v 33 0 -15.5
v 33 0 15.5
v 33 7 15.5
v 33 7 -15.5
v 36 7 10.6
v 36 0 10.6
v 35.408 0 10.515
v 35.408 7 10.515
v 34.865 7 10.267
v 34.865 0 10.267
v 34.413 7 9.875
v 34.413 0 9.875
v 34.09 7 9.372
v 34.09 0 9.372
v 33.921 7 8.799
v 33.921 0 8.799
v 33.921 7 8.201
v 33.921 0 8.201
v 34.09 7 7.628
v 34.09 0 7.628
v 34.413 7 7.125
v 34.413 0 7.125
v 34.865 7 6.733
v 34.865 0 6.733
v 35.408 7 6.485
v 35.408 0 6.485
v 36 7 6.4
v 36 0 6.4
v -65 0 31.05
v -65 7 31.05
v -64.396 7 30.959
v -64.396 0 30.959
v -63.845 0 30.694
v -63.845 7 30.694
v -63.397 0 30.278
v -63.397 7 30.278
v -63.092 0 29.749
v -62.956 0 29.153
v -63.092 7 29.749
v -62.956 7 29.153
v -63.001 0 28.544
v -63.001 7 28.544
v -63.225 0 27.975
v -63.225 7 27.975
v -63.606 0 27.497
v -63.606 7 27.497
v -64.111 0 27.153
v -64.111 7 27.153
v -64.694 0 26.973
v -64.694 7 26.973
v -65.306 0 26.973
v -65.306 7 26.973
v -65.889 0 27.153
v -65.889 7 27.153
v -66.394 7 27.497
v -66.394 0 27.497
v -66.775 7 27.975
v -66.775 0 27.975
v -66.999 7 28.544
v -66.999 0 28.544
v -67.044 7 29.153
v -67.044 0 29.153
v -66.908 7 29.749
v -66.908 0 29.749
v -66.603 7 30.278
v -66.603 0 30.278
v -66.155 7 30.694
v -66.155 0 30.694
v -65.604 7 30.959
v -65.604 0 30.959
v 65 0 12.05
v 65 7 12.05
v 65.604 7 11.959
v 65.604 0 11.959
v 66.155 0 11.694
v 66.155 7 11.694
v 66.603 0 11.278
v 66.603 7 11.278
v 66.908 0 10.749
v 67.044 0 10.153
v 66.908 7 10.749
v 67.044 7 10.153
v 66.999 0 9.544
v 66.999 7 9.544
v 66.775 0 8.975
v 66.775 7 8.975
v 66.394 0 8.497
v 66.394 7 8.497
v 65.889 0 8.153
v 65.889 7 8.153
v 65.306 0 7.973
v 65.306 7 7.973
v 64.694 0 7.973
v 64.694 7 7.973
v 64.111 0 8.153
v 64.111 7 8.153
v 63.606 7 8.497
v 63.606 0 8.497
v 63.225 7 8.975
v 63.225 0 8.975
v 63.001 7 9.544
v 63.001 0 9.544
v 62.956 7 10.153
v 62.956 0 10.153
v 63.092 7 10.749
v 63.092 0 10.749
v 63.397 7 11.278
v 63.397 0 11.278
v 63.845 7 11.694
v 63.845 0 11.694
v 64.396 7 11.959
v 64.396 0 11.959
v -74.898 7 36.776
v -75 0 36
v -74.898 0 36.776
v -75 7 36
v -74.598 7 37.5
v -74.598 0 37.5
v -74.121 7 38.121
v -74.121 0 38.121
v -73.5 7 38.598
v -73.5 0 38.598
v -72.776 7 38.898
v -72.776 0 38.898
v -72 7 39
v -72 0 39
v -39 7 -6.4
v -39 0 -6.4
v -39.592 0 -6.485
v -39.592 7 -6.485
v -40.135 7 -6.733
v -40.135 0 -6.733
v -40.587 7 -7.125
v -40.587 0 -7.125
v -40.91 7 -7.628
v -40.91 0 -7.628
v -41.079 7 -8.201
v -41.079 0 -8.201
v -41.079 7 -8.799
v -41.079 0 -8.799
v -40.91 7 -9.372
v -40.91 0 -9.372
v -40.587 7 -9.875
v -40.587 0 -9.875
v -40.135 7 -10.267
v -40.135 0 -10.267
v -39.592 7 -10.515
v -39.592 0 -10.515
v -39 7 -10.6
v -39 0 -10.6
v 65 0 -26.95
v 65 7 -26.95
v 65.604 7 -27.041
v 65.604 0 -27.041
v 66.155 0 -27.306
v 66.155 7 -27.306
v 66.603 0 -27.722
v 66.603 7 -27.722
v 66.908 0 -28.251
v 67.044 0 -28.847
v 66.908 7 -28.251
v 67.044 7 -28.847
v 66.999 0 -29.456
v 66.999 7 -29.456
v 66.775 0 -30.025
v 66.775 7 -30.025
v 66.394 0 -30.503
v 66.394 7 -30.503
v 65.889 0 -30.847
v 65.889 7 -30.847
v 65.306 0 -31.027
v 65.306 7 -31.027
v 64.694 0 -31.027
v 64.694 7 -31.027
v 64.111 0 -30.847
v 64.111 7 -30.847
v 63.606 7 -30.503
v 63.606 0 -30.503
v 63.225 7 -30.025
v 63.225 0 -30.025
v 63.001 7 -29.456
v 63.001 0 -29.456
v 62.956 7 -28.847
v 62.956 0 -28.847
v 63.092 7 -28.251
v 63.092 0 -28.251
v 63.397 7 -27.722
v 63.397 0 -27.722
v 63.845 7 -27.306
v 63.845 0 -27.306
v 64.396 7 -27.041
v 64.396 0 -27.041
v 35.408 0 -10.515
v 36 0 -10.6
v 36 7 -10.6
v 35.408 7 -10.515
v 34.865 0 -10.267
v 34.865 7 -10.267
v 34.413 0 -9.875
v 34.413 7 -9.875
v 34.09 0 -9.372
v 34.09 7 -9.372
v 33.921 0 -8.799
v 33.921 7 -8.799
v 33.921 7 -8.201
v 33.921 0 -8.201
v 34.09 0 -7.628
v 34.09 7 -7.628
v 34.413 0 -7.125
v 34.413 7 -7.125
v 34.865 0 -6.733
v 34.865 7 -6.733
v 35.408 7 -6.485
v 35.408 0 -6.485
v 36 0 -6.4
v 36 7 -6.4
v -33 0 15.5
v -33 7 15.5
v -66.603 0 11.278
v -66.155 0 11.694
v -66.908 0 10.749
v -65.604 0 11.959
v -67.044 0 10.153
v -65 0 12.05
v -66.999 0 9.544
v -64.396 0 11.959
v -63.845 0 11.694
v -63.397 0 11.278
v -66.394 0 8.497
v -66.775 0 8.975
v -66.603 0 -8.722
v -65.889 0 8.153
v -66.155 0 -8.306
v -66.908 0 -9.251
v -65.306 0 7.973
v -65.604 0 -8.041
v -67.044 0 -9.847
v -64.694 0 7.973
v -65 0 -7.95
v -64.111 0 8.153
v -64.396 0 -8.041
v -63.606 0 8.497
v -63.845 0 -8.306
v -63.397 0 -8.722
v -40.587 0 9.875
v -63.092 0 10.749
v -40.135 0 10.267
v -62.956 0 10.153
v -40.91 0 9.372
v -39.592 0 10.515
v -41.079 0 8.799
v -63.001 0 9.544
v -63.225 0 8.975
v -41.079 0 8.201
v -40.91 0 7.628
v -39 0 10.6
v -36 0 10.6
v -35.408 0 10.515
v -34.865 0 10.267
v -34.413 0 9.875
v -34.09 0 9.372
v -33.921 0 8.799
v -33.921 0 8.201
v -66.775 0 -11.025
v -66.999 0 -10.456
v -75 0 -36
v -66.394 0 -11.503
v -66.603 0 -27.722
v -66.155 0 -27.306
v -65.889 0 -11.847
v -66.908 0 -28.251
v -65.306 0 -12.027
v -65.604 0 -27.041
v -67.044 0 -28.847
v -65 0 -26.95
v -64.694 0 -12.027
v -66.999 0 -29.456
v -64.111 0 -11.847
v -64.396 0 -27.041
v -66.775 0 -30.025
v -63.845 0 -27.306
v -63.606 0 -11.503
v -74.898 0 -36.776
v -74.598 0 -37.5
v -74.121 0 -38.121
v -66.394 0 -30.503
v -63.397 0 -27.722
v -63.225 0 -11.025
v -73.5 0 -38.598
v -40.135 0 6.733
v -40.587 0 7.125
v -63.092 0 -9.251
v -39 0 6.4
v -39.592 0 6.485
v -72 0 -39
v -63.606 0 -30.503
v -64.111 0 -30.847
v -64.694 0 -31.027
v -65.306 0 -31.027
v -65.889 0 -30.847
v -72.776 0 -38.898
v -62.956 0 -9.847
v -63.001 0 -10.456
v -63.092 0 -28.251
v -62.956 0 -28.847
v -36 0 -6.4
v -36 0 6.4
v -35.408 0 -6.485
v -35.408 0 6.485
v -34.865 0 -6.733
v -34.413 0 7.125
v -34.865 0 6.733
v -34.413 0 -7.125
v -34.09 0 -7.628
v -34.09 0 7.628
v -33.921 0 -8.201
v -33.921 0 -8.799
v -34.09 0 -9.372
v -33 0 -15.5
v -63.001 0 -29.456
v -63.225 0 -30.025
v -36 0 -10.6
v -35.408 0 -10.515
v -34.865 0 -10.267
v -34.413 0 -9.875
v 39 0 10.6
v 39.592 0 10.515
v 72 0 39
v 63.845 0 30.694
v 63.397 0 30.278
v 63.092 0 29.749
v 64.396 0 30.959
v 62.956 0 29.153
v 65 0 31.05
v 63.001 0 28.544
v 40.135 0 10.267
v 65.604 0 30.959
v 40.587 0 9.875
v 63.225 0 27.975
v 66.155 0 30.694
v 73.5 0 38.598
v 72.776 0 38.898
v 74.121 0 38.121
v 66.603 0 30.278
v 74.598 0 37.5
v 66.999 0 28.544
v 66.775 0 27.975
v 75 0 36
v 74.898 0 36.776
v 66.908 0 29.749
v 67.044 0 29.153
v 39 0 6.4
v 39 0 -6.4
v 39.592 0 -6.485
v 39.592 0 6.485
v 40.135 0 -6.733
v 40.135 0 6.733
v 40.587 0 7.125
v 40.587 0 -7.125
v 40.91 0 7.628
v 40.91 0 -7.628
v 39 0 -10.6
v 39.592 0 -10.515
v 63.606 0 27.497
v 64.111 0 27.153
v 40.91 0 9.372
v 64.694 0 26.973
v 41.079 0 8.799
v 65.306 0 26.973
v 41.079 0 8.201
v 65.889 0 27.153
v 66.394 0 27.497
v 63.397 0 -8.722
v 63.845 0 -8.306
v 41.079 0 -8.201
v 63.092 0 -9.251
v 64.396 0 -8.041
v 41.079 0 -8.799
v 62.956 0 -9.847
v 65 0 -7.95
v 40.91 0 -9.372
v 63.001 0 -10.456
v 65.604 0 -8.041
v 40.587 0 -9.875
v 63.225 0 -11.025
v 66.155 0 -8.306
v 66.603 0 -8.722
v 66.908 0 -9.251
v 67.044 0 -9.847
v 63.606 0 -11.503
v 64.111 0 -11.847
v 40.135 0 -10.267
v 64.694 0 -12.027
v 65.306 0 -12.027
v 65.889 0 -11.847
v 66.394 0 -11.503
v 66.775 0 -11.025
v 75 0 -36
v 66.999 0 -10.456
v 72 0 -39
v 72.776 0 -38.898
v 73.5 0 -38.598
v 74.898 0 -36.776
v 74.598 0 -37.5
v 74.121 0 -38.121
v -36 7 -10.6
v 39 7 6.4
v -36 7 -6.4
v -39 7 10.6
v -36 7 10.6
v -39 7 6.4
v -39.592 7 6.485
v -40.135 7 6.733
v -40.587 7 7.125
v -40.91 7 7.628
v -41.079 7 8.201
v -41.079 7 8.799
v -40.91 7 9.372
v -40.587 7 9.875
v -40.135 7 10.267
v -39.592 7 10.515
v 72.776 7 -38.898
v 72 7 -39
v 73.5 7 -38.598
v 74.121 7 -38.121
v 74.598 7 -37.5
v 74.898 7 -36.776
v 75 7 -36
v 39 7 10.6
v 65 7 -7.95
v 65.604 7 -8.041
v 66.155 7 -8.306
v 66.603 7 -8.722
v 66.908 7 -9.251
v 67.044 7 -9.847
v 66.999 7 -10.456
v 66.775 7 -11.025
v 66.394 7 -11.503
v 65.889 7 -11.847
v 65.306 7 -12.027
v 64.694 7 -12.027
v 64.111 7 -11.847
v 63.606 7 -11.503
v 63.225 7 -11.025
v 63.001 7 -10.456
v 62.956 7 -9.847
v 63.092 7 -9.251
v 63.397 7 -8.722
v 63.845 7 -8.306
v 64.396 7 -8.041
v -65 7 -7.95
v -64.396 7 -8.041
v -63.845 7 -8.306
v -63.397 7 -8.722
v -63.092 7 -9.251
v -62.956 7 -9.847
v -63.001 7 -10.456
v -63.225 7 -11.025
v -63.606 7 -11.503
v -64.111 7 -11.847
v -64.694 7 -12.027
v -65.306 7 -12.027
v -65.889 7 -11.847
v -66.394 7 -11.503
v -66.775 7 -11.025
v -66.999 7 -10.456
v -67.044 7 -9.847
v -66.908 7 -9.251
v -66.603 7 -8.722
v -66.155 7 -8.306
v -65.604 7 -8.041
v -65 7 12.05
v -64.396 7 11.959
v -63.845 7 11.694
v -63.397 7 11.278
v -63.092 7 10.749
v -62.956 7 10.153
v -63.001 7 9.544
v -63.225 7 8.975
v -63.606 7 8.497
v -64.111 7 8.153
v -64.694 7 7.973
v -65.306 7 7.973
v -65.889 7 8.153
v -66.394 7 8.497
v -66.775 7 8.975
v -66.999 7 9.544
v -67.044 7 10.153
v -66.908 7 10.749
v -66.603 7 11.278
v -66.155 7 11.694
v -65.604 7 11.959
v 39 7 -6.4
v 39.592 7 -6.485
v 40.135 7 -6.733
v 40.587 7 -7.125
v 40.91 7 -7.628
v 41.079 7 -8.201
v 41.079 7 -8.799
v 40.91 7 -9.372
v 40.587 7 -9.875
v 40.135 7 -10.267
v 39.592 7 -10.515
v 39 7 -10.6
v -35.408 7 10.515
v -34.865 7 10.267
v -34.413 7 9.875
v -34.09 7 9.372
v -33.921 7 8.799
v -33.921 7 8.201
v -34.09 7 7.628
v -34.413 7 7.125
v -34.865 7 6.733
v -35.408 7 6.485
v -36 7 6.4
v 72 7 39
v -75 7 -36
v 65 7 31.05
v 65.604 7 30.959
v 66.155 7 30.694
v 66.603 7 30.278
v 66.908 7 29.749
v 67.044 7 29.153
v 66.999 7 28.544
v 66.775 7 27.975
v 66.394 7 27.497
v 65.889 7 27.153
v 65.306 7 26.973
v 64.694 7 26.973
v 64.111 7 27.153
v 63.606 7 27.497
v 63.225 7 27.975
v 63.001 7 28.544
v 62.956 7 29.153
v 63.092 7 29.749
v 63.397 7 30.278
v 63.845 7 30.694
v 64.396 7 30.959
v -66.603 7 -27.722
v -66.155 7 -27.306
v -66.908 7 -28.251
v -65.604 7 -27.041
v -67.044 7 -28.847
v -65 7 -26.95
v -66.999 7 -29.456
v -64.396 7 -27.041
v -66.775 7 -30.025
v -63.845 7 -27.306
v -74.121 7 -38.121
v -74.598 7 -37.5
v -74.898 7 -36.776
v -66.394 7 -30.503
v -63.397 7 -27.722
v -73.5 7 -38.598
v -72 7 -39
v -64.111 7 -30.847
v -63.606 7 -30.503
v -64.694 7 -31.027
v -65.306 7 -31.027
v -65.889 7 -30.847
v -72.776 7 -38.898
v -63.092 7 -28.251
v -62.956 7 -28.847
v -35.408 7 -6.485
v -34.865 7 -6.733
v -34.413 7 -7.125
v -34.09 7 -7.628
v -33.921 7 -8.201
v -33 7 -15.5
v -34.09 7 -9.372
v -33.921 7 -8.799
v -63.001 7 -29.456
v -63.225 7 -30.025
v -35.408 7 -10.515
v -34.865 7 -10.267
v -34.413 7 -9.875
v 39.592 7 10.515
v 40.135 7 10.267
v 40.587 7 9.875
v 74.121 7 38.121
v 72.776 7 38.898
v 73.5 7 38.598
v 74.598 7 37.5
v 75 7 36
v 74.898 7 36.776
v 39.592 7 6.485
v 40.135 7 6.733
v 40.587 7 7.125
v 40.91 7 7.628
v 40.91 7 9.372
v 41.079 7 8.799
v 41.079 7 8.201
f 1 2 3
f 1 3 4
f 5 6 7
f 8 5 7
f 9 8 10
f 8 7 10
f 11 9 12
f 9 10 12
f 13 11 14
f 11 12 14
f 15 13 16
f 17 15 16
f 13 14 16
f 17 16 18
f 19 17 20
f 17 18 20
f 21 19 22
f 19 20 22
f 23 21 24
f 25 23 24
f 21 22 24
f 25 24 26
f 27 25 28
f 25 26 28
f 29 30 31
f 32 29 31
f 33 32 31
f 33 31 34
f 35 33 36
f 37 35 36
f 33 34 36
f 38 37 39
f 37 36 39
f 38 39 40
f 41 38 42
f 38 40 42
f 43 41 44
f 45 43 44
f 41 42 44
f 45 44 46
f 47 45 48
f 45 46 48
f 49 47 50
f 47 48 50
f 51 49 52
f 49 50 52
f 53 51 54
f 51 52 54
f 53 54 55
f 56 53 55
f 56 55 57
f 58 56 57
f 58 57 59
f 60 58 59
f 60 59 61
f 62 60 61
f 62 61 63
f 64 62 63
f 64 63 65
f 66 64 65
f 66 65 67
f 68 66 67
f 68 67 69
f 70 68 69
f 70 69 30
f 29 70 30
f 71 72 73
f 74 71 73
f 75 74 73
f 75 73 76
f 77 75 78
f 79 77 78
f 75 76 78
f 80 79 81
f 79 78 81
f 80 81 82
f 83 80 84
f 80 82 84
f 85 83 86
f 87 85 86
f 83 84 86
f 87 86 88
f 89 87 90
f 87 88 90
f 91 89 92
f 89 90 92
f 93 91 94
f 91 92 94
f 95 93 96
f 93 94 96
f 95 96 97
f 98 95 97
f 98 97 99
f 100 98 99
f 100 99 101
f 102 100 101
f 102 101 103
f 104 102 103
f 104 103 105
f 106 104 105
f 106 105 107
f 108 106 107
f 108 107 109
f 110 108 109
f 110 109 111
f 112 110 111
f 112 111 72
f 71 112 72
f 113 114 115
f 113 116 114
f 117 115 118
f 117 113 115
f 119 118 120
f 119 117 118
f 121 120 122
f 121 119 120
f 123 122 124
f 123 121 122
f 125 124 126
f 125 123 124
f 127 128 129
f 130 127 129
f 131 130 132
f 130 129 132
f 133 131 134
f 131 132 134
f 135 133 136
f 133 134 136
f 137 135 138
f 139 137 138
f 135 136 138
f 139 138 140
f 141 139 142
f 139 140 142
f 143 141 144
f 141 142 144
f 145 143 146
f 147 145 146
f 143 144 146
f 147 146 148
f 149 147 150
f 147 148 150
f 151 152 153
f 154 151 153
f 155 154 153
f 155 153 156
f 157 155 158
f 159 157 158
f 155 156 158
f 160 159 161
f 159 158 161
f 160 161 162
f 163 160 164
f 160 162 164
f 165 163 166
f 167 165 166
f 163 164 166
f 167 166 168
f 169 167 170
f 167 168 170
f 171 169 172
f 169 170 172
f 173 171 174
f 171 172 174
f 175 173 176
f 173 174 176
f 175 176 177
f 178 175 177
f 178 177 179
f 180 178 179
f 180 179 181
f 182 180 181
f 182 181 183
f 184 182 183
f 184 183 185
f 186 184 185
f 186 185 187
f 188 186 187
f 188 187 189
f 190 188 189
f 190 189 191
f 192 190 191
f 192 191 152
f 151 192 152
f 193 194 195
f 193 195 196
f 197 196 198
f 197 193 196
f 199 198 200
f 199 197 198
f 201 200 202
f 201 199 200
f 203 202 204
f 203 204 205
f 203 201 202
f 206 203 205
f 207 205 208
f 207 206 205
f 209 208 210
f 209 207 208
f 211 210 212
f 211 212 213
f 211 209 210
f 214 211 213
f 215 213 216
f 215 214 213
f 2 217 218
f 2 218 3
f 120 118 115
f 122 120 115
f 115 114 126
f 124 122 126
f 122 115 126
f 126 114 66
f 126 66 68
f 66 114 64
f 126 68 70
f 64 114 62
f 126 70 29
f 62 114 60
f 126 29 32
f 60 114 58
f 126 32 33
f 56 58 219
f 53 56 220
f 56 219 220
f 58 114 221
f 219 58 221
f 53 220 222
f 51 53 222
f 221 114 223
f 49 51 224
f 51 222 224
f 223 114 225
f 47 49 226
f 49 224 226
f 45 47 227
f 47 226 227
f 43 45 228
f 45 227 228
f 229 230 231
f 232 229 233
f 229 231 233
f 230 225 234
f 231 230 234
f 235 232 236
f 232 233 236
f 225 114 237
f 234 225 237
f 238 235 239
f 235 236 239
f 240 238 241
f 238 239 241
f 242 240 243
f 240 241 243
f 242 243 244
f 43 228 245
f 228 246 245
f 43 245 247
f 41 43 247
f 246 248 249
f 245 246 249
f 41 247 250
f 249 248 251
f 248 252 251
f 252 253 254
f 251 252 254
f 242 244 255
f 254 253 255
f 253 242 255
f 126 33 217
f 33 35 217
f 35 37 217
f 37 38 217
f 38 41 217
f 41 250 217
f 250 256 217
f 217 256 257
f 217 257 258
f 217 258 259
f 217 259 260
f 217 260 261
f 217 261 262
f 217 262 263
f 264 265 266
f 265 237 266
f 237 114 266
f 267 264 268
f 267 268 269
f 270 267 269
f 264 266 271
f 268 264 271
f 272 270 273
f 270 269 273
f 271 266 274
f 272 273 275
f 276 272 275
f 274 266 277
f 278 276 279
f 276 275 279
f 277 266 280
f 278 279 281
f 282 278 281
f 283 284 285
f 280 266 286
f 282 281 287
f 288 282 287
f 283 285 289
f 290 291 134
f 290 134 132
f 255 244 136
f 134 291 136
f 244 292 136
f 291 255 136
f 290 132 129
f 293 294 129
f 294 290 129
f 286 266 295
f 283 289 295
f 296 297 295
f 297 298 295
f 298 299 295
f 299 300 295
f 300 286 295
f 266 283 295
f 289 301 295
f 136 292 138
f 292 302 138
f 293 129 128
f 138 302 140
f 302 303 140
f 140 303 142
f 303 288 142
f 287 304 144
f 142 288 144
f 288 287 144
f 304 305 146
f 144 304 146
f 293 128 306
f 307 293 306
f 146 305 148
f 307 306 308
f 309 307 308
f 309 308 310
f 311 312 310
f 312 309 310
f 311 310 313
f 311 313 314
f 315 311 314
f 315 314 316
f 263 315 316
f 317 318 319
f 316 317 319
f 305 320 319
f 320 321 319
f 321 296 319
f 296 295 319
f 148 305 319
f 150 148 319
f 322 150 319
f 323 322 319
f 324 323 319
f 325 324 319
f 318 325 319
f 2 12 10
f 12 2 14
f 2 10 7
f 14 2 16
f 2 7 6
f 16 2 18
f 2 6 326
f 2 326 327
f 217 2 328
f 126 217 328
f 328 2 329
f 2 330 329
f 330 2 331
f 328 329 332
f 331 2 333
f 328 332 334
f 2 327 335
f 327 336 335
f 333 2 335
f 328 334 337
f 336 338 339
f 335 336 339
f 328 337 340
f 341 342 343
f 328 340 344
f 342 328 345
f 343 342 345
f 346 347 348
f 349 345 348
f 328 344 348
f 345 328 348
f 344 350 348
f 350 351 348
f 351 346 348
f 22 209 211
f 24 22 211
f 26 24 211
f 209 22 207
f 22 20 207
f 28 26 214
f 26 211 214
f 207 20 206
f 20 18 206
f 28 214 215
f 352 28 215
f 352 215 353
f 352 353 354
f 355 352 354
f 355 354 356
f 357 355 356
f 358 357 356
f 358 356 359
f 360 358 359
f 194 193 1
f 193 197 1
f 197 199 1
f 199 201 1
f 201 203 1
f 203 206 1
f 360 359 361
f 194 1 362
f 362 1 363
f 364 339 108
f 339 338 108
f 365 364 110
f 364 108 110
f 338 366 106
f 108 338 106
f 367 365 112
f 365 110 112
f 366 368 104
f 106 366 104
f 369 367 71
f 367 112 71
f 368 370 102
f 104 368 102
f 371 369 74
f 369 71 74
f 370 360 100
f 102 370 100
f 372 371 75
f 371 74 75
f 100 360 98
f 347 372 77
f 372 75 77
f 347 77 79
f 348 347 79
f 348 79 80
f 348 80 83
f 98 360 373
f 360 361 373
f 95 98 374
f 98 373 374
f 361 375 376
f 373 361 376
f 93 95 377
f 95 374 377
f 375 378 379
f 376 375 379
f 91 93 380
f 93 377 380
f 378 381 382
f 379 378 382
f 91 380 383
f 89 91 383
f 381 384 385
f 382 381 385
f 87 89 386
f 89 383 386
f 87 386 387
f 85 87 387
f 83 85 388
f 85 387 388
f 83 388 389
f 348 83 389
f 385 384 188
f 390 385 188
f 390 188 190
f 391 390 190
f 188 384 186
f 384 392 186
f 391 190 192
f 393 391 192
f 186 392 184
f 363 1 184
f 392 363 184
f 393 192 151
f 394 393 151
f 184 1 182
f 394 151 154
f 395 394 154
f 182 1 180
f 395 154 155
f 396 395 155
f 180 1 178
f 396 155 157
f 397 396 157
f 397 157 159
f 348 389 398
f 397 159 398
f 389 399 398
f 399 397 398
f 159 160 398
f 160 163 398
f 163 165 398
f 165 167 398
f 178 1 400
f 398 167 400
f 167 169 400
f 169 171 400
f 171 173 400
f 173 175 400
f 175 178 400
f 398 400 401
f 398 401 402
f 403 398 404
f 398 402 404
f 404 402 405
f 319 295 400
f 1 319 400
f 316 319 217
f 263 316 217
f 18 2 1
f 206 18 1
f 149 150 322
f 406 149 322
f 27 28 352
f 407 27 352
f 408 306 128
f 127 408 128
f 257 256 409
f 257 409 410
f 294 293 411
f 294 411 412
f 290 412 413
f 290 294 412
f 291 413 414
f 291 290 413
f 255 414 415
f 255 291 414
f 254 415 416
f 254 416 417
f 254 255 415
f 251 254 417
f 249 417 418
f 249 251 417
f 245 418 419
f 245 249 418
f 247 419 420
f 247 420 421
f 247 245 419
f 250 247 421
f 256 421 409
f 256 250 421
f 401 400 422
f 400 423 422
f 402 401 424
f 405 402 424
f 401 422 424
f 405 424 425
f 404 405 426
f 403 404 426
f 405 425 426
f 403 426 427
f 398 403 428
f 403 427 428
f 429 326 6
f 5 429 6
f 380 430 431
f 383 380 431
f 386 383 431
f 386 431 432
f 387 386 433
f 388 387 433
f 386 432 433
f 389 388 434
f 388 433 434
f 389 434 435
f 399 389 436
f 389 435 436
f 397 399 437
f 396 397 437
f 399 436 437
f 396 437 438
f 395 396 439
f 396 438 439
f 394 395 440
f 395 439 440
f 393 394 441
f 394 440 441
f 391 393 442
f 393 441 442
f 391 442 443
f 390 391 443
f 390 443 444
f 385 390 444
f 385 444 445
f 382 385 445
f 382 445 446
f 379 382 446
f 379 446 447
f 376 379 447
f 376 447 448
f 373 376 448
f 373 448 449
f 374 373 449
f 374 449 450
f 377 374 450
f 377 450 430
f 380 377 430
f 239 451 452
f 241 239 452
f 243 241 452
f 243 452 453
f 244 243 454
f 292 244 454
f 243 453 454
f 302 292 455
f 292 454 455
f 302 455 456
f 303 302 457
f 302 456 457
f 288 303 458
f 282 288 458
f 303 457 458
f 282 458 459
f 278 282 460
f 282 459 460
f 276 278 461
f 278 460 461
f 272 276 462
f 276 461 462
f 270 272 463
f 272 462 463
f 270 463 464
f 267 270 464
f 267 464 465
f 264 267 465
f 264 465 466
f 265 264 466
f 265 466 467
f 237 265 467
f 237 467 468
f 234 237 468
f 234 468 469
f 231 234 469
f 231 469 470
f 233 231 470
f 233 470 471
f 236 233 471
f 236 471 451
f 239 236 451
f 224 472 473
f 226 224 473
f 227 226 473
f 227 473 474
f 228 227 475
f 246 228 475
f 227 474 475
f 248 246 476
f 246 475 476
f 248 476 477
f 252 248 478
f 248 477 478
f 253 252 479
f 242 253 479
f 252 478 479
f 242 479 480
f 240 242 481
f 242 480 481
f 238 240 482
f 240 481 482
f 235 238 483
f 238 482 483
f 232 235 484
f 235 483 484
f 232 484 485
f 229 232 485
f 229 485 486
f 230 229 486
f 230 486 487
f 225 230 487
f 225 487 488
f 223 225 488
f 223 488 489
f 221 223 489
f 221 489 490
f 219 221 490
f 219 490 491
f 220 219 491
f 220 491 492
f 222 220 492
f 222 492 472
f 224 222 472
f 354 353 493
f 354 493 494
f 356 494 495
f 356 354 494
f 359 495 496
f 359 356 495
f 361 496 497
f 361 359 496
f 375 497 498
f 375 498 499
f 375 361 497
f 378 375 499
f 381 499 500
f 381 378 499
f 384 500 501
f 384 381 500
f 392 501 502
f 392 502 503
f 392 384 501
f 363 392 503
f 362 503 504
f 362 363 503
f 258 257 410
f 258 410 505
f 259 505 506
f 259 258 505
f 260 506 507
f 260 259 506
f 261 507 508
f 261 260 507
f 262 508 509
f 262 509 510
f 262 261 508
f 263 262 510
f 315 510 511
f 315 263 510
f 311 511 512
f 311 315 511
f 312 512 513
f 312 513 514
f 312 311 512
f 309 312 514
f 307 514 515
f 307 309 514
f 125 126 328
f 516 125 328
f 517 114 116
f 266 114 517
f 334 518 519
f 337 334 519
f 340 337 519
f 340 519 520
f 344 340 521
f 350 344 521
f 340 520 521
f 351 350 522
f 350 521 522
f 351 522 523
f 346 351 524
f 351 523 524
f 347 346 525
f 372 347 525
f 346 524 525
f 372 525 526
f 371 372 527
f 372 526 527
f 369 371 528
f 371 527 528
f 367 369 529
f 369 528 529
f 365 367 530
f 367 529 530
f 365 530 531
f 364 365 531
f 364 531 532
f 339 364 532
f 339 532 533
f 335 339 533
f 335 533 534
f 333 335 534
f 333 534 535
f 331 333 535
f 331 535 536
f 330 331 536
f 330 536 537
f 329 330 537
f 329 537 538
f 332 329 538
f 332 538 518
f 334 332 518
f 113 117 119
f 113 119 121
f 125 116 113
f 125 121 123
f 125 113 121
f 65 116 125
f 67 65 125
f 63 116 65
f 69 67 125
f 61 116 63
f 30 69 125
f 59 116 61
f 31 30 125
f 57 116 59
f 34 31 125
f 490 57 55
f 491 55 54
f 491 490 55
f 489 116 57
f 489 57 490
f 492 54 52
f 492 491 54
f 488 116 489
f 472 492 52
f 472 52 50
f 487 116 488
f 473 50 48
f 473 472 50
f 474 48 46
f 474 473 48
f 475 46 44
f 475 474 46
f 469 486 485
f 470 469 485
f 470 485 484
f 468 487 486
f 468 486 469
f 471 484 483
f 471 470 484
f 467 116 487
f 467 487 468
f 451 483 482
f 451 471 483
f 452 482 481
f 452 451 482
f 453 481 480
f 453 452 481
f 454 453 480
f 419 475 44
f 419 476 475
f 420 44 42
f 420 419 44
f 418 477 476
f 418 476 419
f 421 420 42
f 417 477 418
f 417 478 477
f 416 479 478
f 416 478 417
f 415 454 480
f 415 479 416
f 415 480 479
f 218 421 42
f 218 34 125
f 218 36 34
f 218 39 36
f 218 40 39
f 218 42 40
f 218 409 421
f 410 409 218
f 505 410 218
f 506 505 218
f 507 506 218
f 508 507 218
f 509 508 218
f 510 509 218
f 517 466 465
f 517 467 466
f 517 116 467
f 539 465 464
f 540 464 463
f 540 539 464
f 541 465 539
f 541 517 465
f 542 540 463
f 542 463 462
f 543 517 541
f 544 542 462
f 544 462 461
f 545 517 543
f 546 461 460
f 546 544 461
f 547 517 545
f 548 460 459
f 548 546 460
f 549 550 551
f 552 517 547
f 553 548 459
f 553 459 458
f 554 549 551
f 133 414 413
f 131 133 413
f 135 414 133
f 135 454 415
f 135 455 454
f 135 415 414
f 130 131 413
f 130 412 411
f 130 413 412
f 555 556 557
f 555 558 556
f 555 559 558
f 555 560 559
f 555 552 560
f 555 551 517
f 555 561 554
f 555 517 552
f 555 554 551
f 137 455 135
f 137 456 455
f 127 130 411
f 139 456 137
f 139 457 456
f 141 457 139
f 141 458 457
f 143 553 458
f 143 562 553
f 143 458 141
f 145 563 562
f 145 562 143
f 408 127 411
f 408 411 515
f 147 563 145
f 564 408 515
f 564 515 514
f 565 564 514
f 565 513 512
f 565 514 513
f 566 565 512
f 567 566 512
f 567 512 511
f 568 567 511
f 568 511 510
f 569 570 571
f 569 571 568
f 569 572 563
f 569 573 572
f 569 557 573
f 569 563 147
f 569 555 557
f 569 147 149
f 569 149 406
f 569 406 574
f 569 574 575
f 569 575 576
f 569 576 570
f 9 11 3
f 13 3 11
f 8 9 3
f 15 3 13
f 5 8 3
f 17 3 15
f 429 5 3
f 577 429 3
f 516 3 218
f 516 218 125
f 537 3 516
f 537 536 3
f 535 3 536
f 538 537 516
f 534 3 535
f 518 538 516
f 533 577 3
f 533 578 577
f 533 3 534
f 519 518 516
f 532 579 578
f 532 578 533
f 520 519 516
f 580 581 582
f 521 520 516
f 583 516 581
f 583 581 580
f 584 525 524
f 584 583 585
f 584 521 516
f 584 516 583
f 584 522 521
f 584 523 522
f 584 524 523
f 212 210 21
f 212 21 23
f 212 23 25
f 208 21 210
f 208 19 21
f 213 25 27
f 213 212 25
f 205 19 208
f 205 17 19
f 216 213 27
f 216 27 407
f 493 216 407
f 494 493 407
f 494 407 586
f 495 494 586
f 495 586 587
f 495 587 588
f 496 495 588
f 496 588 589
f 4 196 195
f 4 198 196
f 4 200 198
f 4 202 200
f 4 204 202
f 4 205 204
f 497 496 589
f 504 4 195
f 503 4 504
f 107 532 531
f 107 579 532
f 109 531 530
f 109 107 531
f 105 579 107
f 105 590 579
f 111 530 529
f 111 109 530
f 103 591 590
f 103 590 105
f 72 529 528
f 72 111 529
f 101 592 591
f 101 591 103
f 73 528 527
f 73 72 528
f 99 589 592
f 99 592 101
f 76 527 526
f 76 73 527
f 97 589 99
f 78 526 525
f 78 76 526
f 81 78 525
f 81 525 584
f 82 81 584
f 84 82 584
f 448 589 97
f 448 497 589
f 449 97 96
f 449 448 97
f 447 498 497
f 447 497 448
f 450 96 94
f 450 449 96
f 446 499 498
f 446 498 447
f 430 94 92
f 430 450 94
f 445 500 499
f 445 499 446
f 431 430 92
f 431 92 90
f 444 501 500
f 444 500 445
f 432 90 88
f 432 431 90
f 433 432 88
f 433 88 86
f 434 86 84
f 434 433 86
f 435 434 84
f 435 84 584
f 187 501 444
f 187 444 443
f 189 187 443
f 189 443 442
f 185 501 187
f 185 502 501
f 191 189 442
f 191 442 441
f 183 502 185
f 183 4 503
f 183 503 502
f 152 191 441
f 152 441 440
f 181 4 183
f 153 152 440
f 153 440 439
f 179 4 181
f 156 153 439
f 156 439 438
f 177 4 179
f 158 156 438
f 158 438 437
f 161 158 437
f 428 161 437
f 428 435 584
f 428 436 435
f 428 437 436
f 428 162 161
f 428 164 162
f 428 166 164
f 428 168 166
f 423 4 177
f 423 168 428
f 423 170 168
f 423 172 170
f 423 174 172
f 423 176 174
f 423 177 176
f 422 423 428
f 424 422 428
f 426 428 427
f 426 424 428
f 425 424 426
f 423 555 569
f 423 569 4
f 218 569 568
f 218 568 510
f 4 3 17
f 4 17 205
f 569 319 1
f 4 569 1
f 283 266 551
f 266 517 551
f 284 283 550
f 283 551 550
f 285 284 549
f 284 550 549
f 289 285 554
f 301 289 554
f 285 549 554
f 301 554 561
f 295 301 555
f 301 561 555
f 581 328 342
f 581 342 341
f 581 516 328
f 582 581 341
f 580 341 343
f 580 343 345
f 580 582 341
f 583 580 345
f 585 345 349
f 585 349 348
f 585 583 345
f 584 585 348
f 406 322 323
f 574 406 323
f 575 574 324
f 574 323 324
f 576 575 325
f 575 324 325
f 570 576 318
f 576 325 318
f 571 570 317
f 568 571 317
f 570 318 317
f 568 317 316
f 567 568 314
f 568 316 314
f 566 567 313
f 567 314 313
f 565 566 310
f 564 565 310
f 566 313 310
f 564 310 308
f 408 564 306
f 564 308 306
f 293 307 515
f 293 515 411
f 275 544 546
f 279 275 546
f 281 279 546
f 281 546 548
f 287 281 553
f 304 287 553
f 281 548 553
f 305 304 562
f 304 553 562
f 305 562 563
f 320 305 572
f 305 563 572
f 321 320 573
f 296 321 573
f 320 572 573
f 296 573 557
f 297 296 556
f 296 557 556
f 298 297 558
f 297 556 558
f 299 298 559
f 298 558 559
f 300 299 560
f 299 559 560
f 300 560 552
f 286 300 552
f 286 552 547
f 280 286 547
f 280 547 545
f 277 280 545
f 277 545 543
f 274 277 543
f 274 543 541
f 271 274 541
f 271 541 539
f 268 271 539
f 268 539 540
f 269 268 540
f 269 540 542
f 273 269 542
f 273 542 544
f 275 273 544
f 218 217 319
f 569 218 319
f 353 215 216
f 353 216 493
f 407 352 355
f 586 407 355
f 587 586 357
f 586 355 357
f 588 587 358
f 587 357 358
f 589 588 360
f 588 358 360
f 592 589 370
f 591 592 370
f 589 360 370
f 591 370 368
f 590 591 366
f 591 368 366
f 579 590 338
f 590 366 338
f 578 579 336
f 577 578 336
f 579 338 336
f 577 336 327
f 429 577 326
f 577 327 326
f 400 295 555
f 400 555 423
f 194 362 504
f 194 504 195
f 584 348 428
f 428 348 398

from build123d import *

# Parameters (mm, degrees)
SKETCH2_W           = 150
SKETCH2_H           = 78
SKETCH2_W_2         = 66
SKETCH2_H_2         = 31
BOSS_EXTRUDE1_DEPTH = 7
FILLET1_R           = 3
SKETCH3_R           = 2.05
CUT_EXTRUDE1_DEPTH  = 10


with BuildPart() as part:
    # Sketch2 → Boss-Extrude1 (new body)
    with BuildSketch(Plane(origin=(0, 0, 0), x_dir=(1, 0, 0), z_dir=(0, 1, 0))):
        Rectangle(SKETCH2_W, SKETCH2_H)
        Rectangle(SKETCH2_W_2, SKETCH2_H_2, mode=Mode.SUBTRACT)
        with BuildLine():
            Line((-39, 10.6), (-36, 10.6))
            ThreePointArc((-36, 10.6), (-33.9, 8.5), (-36, 6.4))
            Line((-36, 6.4), (-39, 6.4))
            ThreePointArc((-39, 6.4), (-41.1, 8.5), (-39, 10.6))
        make_face(mode=Mode.SUBTRACT)
        with BuildLine():
            Line((-39, -10.6), (-36, -10.6))
            ThreePointArc((-36, -10.6), (-33.9, -8.5), (-36, -6.4))
            Line((-36, -6.4), (-39, -6.4))
            ThreePointArc((-39, -6.4), (-41.1, -8.5), (-39, -10.6))
        make_face(mode=Mode.SUBTRACT)
        with BuildLine():
            Line((39, -10.6), (36, -10.6))
            ThreePointArc((36, -10.6), (33.9, -8.5), (36, -6.4))
            Line((36, -6.4), (39, -6.4))
            ThreePointArc((39, -6.4), (41.1, -8.5), (39, -10.6))
        make_face(mode=Mode.SUBTRACT)
        with BuildLine():
            Line((39, 10.6), (36, 10.6))
            ThreePointArc((36, 10.6), (33.9, 8.5), (36, 6.4))
            Line((36, 6.4), (39, 6.4))
            ThreePointArc((39, 6.4), (41.1, 8.5), (39, 10.6))
        make_face(mode=Mode.SUBTRACT)
    extrude(amount=BOSS_EXTRUDE1_DEPTH)

    # Fillet1
    fillet1_edges = [part.edges().sort_by_distance(p)[0] for p in [
        (75, 3.5, 39),
        (-75, 3.5, 39),
        (-75, 3.5, -39),
        (75, 3.5, -39),
    ]]
    fillet(fillet1_edges, radius=FILLET1_R)

    # Sketch3 → Cut-Extrude1 (cut)
    with BuildSketch(Plane(origin=(0, 7, 0), x_dir=(1, 0, 0), z_dir=(0, 1, 0))):
        with Locations(Location((-65, 10, 0), (0, 0, 270))):
            Circle(SKETCH3_R)
        with Locations(Location((-65, 29, 0), (0, 0, 270))):
            Circle(SKETCH3_R)
        with Locations(Location((-65, -10, 0), (0, 0, 270))):
            Circle(SKETCH3_R)
        with Locations(Location((-65, -29, 0), (0, 0, 270))):
            Circle(SKETCH3_R)
        with Locations(Location((65, -29, 0), (0, 0, 270))):
            Circle(SKETCH3_R)
        with Locations(Location((65, -10, 0), (0, 0, 270))):
            Circle(SKETCH3_R)
        with Locations(Location((65, 10, 0), (0, 0, 270))):
            Circle(SKETCH3_R)
        with Locations(Location((65, 29, 0), (0, 0, 270))):
            Circle(SKETCH3_R)
    extrude(amount=-CUT_EXTRUDE1_DEPTH, mode=Mode.SUBTRACT)


solid = part.part
